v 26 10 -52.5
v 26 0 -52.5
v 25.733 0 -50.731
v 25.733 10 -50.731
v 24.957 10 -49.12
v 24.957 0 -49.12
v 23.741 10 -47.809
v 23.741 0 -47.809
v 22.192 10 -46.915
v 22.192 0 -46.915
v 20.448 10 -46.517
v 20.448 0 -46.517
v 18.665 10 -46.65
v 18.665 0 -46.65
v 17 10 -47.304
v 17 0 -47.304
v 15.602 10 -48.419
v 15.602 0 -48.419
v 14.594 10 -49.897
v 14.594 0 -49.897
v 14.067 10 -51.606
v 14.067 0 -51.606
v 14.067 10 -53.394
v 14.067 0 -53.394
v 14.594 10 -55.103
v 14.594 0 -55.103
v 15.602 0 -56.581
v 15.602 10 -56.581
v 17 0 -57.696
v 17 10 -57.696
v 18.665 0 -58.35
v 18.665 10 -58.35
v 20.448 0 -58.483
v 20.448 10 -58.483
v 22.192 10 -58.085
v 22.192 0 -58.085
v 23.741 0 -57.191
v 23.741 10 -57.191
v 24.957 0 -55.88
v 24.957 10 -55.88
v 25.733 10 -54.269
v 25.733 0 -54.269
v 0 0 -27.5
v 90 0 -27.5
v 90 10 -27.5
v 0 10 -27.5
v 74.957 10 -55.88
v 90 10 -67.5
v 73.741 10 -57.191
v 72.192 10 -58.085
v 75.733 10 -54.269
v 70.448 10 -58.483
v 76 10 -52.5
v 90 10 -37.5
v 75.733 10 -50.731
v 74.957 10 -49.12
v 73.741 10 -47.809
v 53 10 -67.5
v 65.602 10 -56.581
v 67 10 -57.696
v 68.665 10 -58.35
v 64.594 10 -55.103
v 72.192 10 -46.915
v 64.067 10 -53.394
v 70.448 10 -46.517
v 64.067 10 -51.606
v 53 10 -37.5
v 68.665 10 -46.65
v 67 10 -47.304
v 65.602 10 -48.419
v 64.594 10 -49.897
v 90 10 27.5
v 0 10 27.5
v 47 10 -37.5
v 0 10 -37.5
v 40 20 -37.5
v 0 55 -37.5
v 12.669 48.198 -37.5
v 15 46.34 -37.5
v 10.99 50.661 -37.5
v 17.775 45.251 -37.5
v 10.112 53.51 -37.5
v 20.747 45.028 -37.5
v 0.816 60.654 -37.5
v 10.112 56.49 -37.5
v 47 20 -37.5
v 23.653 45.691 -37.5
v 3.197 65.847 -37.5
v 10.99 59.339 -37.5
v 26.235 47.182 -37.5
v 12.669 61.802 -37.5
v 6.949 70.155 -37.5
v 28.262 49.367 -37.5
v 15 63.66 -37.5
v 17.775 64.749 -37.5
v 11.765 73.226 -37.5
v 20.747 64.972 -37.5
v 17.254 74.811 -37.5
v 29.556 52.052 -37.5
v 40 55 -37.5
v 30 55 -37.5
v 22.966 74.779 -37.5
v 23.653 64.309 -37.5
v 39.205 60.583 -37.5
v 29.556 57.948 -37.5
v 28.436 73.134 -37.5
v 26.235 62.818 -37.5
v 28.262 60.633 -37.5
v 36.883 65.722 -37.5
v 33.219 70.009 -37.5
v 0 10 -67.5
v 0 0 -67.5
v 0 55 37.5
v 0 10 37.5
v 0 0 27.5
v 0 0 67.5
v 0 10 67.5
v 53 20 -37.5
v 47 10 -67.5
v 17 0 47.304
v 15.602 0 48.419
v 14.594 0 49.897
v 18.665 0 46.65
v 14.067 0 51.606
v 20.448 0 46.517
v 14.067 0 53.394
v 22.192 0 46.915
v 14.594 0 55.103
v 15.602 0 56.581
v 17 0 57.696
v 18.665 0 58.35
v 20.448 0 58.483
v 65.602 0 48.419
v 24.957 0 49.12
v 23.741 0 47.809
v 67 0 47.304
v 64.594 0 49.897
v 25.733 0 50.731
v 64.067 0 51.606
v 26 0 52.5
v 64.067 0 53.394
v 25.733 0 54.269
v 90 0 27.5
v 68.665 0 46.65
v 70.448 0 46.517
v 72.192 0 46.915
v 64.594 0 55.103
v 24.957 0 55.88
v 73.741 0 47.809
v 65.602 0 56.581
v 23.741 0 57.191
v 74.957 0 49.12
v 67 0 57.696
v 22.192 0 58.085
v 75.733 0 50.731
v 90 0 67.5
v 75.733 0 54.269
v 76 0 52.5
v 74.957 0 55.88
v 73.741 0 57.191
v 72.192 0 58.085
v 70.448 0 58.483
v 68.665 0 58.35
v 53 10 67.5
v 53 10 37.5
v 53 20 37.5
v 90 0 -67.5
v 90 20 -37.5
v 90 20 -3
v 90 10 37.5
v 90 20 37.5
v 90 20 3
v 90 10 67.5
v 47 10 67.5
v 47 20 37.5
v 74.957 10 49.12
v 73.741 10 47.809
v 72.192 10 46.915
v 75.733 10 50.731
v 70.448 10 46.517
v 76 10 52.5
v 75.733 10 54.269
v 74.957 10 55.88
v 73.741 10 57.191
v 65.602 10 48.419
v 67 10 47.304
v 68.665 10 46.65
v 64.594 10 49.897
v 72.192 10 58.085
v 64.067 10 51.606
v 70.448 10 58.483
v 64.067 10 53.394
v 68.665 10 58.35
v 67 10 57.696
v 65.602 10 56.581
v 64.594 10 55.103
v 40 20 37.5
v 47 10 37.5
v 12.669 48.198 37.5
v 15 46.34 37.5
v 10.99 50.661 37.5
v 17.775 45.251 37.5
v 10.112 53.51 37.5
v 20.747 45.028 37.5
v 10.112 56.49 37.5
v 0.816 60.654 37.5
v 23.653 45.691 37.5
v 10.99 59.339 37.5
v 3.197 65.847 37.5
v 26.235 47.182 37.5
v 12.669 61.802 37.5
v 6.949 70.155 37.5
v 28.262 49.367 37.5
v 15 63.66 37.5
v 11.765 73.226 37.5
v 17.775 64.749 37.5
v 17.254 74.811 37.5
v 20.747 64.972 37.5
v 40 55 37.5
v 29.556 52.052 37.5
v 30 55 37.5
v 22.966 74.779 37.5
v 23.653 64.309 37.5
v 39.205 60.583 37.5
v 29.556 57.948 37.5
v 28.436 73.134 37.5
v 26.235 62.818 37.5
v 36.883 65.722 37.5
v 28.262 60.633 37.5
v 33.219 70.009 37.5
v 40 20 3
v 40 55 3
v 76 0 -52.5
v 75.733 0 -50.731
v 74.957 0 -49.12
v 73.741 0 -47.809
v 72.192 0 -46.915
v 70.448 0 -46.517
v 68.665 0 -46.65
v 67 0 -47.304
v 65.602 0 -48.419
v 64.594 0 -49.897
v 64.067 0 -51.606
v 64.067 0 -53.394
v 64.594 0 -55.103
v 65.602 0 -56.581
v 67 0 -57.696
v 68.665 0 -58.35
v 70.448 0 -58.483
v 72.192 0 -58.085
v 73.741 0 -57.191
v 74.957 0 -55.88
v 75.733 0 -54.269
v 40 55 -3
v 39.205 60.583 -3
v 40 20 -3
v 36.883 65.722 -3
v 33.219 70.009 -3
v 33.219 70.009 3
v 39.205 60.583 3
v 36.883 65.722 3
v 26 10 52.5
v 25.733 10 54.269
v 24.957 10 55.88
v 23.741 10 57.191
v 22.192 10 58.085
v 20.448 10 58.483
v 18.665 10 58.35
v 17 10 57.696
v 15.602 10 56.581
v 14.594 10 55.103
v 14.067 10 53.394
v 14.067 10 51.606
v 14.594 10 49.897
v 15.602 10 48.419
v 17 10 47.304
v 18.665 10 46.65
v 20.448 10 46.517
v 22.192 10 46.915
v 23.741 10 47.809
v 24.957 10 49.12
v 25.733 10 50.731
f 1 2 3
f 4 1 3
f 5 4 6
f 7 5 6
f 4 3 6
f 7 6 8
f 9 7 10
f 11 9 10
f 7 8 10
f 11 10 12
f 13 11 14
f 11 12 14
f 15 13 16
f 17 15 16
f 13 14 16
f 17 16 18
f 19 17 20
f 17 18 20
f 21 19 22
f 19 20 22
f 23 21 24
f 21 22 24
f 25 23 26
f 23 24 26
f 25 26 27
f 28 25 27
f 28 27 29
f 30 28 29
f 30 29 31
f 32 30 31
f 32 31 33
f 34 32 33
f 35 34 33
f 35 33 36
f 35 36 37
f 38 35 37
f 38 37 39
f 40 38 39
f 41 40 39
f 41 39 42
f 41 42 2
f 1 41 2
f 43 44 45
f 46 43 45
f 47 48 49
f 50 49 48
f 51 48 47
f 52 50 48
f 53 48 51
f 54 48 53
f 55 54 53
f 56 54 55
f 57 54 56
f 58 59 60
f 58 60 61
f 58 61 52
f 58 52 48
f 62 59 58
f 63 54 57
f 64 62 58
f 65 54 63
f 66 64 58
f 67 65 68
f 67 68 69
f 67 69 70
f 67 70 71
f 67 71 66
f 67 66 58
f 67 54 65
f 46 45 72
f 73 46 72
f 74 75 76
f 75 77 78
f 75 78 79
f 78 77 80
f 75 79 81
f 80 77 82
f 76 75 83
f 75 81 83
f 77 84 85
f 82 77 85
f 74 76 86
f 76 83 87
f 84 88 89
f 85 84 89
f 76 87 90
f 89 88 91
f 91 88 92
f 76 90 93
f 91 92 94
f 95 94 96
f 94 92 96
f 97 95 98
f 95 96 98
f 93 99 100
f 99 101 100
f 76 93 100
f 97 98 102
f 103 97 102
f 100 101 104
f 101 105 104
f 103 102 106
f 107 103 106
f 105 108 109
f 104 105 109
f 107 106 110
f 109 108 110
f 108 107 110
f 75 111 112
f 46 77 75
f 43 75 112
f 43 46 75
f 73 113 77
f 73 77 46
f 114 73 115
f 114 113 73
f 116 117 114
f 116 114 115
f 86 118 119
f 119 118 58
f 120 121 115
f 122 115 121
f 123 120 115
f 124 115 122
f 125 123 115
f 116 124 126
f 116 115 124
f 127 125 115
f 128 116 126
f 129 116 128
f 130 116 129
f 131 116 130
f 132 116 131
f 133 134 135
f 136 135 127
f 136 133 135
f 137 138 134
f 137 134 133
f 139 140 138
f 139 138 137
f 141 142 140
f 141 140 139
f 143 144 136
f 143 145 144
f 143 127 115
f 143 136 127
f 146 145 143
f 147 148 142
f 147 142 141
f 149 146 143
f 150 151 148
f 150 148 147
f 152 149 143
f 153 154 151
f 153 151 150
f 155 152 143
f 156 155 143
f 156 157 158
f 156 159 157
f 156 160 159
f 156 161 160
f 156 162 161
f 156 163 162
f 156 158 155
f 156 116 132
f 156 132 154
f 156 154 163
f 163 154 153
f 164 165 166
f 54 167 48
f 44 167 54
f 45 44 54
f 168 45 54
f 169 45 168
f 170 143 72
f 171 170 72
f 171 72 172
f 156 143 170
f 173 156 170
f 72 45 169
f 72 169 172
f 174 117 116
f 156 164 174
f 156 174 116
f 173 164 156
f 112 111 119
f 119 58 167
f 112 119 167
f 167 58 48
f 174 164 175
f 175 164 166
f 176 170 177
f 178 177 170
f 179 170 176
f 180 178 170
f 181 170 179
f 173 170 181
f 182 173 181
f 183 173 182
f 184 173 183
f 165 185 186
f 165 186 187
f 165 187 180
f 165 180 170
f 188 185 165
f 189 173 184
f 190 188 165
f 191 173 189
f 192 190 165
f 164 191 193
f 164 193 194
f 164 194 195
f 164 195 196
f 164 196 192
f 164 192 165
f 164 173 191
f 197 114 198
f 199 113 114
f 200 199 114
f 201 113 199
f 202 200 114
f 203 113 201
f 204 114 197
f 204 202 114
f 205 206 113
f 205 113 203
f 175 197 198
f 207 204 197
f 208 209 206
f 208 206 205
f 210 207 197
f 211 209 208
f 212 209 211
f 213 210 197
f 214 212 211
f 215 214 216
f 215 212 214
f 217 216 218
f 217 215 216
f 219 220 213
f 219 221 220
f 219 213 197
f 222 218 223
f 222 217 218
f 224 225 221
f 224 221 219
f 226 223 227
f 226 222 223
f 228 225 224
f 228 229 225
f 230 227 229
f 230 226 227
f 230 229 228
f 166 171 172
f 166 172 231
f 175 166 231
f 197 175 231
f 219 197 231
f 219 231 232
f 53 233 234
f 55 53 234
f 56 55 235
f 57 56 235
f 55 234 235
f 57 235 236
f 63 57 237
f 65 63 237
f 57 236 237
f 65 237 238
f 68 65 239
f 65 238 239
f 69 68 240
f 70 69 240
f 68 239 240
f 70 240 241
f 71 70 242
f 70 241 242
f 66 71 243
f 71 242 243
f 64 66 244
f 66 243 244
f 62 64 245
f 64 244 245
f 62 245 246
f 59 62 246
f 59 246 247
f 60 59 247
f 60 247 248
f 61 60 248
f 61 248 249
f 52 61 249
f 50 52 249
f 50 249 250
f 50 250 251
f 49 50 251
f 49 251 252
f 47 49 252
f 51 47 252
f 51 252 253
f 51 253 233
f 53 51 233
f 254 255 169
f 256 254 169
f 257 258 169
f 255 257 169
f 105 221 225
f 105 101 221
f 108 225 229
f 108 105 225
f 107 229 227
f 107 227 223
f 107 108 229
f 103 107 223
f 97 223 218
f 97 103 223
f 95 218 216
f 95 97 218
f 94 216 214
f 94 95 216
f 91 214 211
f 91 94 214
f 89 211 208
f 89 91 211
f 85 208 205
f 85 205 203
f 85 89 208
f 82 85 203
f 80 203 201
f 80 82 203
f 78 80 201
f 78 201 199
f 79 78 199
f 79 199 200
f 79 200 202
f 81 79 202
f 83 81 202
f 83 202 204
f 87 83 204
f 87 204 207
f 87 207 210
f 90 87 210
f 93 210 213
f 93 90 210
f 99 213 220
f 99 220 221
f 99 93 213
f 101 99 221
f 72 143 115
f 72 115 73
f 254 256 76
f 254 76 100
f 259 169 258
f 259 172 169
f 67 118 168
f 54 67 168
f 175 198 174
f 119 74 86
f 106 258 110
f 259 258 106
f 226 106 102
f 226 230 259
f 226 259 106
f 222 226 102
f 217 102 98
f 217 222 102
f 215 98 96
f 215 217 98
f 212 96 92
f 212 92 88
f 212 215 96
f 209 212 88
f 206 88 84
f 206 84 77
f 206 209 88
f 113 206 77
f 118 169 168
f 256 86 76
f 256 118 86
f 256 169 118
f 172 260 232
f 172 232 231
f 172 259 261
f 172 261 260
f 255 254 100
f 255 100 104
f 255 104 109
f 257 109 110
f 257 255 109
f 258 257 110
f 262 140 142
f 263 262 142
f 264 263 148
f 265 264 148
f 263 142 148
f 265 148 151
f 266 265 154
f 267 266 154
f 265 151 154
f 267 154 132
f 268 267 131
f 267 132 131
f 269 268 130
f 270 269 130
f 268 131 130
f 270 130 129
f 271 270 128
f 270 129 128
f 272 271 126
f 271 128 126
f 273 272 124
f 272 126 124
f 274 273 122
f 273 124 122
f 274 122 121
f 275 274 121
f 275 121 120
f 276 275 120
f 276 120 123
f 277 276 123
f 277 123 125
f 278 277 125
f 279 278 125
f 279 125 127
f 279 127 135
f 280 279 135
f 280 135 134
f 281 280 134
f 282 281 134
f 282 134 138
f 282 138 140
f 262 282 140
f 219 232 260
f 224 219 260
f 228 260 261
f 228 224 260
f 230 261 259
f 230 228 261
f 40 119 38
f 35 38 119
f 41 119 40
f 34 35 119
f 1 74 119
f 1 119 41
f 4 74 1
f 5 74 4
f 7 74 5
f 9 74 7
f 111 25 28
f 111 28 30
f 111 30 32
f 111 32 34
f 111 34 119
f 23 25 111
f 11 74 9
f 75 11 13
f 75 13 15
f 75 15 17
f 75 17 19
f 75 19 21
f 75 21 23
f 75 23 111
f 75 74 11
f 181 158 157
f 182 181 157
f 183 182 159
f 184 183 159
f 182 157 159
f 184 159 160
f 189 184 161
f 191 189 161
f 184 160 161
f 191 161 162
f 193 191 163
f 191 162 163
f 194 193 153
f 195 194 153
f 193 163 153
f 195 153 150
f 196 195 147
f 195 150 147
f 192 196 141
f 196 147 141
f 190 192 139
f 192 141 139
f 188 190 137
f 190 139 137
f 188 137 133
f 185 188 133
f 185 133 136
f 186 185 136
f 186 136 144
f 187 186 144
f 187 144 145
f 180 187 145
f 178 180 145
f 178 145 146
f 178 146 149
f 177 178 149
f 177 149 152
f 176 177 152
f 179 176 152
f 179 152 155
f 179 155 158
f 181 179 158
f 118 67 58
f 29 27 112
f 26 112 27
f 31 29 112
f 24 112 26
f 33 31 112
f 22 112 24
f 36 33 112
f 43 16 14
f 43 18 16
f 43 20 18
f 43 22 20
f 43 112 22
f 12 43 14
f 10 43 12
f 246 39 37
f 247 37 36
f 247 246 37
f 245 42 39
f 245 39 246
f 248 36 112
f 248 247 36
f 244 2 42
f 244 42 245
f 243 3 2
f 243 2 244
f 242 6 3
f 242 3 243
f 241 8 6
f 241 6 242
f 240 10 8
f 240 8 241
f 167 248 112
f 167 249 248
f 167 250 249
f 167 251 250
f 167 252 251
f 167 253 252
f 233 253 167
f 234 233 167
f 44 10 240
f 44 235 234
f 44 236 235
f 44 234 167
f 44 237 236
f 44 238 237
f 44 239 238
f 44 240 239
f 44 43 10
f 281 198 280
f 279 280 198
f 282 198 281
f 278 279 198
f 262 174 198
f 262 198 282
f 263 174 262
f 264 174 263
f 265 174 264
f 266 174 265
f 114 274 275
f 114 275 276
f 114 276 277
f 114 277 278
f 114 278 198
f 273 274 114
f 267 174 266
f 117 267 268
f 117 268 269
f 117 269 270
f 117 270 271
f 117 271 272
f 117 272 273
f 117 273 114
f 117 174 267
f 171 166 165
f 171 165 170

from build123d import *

# Parameters (mm, degrees)
F0_W     = 6
F0_H     = 10
F1_DEPTH = 67.5
F0_R     = 10
F0_W_2   = 7
F0_W_3   = 37
F2_DEPTH = 37.5
F3_DEPTH = 3
F4_W     = 10
F4_H     = 55
F5_DEPTH = 90.001
F6_R     = 6
F7_DEPTH = 75.001


with BuildPart() as f1:
    # F0 (on Top) → F1 (new body, symmetric)
    with BuildSketch(Plane.XY):
        Polygon((0, 10), (0, 0), (90, 0), (90, 10), (53, 10), (47, 10), (40, 10), align=None)
        with Locations((50, 15)):
            Rectangle(F0_W, F0_H)
    extrude(amount=F1_DEPTH, both=True)

    # F0 (on Top) → F2 (join, symmetric)
    with BuildSketch(Plane.XY):
        with BuildLine():
            Line((0, 55), (0, 10))
            Line((0, 10), (40, 10))
            Line((40, 10), (40, 20))
            Line((40, 20), (40, 55))
            ThreePointArc((40, 55), (38.226001, 63.234858), (33.218712, 70.008853))
            ThreePointArc((33.218712, 70.008853), (11.765142, 73.226001), (0, 55))
        make_face()
        with Locations((20, 55)):
            Circle(F0_R, mode=Mode.SUBTRACT)
        with Locations((43.5, 15)):
            Rectangle(F0_W_2, F0_H)
        with Locations((71.5, 15)):
            Rectangle(F0_W_3, F0_H)
        with Locations((50, 15)):
            Rectangle(F0_W, F0_H)
    extrude(amount=F2_DEPTH, both=True)

    # F0 (on Top) → F3 (join, symmetric)
    with BuildSketch(Plane.XY):
        with BuildLine():
            Line((53, 20), (90, 20))
            Line((90, 20), (33.218712, 70.008853))
            ThreePointArc((33.218712, 70.008853), (38.226001, 63.234858), (40, 55))
            Line((40, 55), (40, 20))
            Line((40, 20), (47, 20))
            Line((47, 20), (53, 20))
        make_face()
    extrude(amount=F3_DEPTH, both=True)

    # F4 (on face) → F5 (cut, through all)
    with BuildSketch(Plane.YZ.offset(90)):
        Polygon((10, 67.5), (20, 37.5), (20, 67.5), align=None)
        Polygon((20, -67.5), (20, -37.5), (10, -67.5), align=None)
        with Locations((5, 0)):
            Rectangle(F4_W, F4_H)
    extrude(amount=-F5_DEPTH, mode=Mode.SUBTRACT)

    # F6 (on face) → F7 (cut, through all)
    with BuildSketch(Plane.XZ):
        with Locations((70, 52.5)):
            Circle(F6_R)
        with Locations((20, 52.5)):
            Circle(F6_R)
        with Locations((70, -52.5)):
            Circle(F6_R)
        with Locations((20, -52.5)):
            Circle(F6_R)
    extrude(amount=-F7_DEPTH, mode=Mode.SUBTRACT)


solid = f1.part
